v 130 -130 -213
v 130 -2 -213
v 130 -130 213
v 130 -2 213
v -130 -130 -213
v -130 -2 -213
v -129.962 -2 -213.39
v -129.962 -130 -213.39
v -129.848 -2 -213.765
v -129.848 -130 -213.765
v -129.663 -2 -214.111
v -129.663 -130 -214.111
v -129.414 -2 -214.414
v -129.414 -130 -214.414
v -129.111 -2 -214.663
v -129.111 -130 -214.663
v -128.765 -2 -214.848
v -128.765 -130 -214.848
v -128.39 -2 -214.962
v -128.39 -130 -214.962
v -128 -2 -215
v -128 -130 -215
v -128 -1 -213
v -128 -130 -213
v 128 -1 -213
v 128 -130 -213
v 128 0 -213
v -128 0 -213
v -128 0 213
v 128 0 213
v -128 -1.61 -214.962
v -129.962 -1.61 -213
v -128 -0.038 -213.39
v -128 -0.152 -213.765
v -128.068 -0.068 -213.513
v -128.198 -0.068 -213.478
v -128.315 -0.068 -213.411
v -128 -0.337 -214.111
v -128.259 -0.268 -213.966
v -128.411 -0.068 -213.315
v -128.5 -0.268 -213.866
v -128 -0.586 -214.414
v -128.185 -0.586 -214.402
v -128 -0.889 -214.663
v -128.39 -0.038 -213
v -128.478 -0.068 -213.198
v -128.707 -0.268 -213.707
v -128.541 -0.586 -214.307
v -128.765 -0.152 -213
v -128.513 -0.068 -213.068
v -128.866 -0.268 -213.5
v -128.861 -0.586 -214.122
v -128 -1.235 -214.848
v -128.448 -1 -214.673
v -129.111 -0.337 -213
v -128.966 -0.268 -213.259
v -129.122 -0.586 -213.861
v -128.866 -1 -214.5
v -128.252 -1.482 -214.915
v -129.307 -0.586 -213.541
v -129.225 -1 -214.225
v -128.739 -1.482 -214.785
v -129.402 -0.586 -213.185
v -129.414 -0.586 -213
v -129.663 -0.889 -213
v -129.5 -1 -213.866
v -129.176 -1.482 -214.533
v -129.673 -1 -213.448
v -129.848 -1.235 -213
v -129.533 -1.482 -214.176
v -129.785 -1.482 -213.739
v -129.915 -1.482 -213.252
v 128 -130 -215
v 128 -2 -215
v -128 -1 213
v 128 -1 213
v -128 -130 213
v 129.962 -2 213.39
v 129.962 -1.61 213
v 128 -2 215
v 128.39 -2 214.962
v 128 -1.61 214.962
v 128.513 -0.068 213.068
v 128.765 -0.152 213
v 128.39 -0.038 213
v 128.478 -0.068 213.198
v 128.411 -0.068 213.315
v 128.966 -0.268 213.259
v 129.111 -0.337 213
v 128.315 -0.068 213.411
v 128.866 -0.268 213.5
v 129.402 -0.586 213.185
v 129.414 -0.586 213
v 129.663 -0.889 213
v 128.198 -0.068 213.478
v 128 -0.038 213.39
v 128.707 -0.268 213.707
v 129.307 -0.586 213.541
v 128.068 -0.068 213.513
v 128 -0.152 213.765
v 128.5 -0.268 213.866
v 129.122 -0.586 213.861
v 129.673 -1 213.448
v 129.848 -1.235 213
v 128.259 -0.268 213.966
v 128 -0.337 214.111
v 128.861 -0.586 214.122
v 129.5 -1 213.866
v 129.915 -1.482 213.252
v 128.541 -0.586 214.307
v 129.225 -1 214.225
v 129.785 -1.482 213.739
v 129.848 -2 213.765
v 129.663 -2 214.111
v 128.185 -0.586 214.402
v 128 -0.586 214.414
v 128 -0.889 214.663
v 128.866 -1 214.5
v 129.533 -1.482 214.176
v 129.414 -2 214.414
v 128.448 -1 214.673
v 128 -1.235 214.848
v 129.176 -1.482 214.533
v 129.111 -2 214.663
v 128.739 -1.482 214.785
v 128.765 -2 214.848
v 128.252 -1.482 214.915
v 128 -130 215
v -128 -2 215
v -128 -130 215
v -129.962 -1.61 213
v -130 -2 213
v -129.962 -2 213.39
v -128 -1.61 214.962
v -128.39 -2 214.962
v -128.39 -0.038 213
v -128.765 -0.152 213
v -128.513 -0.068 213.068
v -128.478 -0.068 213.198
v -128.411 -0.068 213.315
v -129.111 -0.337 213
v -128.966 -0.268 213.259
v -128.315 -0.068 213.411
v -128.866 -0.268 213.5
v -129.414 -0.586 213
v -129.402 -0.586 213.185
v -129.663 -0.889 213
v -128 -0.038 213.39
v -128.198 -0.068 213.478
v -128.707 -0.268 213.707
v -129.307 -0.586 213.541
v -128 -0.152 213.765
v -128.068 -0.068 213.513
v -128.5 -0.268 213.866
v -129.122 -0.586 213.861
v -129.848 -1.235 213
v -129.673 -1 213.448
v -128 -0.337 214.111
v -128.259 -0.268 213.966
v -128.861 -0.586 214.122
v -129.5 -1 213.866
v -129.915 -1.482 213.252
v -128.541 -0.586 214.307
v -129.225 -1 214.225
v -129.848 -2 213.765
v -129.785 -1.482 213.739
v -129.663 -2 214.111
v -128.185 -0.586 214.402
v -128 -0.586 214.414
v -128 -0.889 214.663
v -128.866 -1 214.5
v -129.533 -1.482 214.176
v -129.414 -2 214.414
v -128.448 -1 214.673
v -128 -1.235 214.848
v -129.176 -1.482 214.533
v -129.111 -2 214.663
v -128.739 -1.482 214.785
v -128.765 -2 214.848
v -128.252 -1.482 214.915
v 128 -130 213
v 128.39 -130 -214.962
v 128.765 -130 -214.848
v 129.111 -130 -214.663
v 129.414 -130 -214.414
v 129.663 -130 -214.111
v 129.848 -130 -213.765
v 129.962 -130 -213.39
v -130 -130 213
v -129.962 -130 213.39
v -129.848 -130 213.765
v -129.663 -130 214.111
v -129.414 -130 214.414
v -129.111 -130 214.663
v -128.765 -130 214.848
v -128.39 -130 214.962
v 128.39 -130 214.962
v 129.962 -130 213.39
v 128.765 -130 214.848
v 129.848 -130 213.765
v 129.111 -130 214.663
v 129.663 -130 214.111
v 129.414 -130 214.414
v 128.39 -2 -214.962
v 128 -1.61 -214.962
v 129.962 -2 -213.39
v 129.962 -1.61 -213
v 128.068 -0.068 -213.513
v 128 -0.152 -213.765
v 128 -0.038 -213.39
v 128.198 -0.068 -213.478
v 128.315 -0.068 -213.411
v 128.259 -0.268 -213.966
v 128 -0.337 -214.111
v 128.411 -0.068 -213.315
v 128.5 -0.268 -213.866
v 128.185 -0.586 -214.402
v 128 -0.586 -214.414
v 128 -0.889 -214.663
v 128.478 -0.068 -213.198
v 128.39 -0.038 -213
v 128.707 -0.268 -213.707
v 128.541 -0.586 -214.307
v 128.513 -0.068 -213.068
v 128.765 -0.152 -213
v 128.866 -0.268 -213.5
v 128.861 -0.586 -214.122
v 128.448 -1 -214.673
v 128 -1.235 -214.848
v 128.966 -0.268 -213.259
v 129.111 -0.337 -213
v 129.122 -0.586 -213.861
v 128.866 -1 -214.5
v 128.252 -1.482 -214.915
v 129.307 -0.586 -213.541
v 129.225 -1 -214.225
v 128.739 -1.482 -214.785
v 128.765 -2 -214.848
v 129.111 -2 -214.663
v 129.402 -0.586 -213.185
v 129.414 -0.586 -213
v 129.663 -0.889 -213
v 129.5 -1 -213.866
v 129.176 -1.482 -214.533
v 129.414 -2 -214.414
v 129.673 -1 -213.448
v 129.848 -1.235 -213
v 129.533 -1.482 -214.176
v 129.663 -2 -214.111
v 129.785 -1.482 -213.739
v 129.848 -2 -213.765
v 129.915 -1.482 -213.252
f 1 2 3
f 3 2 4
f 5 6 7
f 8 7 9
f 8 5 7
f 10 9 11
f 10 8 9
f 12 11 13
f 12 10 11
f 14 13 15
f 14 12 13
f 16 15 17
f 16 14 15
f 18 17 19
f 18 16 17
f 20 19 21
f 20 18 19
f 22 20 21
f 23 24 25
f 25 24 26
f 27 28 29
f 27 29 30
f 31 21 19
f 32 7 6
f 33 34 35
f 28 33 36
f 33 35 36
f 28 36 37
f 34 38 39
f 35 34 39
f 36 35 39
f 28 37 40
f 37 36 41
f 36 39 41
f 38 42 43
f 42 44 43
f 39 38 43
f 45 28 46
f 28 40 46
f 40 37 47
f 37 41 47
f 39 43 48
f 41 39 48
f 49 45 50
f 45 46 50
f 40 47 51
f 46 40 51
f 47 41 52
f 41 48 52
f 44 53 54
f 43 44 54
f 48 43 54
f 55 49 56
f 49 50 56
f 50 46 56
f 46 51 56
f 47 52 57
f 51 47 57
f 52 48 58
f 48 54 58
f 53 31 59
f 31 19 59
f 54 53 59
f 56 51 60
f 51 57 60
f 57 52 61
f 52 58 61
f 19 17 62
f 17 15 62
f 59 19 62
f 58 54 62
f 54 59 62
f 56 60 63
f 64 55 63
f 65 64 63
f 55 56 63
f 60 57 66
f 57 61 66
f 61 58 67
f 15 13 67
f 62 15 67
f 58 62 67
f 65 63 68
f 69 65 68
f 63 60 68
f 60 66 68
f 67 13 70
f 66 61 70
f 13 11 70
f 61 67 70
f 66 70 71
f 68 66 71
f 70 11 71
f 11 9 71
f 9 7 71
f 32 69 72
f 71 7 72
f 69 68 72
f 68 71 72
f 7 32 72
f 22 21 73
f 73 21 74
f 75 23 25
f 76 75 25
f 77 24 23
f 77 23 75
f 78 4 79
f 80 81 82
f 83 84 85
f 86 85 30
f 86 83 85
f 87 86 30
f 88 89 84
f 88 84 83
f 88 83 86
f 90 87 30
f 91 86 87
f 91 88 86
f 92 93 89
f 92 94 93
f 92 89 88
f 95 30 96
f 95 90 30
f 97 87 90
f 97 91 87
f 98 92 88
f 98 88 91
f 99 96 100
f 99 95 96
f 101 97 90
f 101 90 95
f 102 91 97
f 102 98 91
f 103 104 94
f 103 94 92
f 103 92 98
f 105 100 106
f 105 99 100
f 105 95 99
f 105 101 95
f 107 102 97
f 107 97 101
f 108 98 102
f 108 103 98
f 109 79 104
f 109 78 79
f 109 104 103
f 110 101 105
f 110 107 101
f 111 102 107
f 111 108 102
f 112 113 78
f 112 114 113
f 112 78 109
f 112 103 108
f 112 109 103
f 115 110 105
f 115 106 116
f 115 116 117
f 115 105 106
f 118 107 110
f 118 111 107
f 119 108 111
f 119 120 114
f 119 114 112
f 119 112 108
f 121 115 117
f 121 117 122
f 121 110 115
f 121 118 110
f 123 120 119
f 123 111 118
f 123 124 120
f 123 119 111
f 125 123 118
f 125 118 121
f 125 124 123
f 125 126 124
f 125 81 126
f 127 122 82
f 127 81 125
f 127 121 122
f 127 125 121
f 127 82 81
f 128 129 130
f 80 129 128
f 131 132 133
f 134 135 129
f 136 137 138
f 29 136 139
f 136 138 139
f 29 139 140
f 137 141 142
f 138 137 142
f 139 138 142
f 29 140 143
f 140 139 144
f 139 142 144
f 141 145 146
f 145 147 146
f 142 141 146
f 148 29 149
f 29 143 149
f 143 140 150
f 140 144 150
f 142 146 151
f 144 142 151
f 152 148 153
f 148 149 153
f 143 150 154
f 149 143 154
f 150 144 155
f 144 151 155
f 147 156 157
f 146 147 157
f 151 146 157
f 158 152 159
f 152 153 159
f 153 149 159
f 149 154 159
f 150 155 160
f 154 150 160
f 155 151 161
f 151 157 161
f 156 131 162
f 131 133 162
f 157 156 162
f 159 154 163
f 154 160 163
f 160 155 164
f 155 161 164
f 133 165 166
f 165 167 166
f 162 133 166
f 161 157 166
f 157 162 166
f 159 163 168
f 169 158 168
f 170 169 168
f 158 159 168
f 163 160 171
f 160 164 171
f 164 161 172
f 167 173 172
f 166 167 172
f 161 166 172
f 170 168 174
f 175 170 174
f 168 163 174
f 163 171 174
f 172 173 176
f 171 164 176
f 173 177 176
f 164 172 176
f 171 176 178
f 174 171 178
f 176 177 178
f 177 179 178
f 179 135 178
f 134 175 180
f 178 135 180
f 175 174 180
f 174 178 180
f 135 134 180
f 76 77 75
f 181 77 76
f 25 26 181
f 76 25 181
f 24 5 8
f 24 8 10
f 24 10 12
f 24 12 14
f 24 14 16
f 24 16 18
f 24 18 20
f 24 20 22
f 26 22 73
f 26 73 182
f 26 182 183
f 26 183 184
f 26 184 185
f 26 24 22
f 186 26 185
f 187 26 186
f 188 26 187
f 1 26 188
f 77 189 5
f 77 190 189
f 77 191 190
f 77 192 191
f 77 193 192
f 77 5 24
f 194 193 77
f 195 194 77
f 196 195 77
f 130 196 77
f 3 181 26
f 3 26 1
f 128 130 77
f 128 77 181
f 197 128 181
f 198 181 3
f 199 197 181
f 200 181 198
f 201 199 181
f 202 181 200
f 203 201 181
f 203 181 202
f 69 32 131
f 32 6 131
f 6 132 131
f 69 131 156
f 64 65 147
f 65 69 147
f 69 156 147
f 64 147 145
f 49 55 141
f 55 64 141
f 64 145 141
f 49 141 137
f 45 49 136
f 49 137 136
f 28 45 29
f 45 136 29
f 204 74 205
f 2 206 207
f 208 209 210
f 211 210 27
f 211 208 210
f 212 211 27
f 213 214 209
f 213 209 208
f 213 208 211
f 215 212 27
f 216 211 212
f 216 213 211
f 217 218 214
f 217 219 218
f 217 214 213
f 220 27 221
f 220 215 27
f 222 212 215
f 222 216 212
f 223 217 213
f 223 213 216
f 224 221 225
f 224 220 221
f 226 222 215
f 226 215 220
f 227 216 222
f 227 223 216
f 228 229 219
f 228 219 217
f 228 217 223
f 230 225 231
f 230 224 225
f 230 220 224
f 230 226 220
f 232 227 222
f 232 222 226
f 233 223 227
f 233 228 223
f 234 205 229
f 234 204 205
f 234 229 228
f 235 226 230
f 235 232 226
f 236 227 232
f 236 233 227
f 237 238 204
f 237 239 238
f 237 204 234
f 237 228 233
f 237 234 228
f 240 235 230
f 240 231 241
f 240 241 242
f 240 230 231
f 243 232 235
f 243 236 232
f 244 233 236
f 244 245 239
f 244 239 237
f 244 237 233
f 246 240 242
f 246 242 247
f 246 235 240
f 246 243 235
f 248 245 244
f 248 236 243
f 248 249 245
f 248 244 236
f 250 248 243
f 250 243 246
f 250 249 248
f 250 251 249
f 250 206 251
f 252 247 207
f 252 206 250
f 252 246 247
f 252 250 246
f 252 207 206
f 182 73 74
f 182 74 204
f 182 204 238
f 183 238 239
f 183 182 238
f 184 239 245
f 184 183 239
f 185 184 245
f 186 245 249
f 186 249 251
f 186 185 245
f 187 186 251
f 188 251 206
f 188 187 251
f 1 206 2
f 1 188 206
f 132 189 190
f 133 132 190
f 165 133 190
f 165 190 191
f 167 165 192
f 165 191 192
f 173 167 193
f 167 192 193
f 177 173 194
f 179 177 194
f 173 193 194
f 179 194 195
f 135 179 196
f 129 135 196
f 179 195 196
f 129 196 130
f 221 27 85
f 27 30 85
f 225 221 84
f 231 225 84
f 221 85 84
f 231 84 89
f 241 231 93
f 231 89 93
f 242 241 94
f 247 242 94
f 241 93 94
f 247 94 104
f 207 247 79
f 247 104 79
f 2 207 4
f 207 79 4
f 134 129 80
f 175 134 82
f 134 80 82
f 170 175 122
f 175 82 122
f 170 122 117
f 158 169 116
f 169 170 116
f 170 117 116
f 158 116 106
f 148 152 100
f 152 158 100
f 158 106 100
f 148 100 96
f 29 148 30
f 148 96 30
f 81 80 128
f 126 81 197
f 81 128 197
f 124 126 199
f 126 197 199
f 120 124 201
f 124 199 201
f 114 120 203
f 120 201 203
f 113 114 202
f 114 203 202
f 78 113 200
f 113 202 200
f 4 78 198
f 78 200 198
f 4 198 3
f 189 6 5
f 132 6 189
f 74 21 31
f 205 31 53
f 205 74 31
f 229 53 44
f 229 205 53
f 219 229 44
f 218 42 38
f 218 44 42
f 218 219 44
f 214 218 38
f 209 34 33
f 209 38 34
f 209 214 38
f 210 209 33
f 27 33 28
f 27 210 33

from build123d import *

# Parameters (mm, degrees)
F0_W     = 260
F0_H     = 430
F1_DEPTH = 130
F2_W     = 256
F2_H     = 426
F3_DEPTH = 129
F4_R     = 2


with BuildPart() as f1:
    # F0 (on Front) → F1 (new body)
    with BuildSketch(Plane.XZ):
        Rectangle(F0_W, F0_H)
    extrude(amount=F1_DEPTH)

    # F2 (on face) → F3 (cut)
    with BuildSketch(Plane.XZ.offset(130)):
        Rectangle(F2_W, F2_H)
    extrude(amount=-F3_DEPTH, mode=Mode.SUBTRACT)

    # F4
    f4_edges = [f1.edges().sort_by_distance(p)[0] for p in [
        (-130, -65, 215),
        (130, -65, 215),
        (-130, -65, -215),
        (130, -65, -215),
        (0, 0, -215),
        (130, 0, 0),
        (-130, 0, 0),
        (0, 0, 215),
    ]]
    fillet(f4_edges, radius=F4_R)


solid = f1.part
